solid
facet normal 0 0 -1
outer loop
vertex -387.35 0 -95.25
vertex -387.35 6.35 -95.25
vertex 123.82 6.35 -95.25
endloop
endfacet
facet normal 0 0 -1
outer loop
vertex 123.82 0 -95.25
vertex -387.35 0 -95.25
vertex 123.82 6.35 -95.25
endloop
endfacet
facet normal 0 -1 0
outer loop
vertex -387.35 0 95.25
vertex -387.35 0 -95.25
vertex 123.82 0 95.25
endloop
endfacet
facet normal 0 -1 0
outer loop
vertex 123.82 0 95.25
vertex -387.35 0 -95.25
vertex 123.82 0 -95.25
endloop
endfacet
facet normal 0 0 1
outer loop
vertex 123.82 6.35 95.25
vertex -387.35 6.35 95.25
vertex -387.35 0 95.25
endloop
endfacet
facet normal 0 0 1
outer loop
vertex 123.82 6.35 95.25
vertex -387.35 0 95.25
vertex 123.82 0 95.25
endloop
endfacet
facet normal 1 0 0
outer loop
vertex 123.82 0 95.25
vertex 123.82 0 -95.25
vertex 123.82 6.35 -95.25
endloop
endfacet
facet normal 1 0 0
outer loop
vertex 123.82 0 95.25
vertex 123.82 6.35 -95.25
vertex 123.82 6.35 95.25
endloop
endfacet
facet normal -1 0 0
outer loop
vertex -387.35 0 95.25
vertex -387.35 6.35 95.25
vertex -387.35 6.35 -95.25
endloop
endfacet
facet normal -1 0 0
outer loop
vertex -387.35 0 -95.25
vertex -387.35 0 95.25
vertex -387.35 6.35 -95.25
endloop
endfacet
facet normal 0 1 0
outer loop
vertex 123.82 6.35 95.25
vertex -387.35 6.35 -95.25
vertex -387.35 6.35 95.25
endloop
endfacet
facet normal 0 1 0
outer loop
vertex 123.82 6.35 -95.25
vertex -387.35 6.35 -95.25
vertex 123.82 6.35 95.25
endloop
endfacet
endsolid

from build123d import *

# Parameters (mm, degrees)
SKETCH1_W           = 762
SKETCH1_H           = 177.8
BOSS_EXTRUDE1_DEPTH = 6.35
SKETCH5_W           = 774.7
SKETCH5_H           = 190.5
SKETCH5_W_2         = 762
SKETCH5_H_2         = 177.8
BOSS_EXTRUDE2_DEPTH = 6.35
SKETCH7_W           = 263.53
SKETCH7_H           = 190.5
CUT_EXTRUDE2_DEPTH  = 399.939729157


with BuildPart() as part:
    # Sketch1 → Boss-Extrude1 (new body)
    with BuildSketch(Plane(origin=(0, 0, 0), x_dir=(1, 0, 0), z_dir=(0, 1, 0))):
        Rectangle(SKETCH1_W, SKETCH1_H)
    extrude(amount=BOSS_EXTRUDE1_DEPTH)

    # Sketch5 → Boss-Extrude2 (add)
    with BuildSketch(Plane(origin=(0, 6.35, 0), x_dir=(1, 0, 0), z_dir=(0, 1, 0))):
        Rectangle(SKETCH5_W, SKETCH5_H)
        Rectangle(SKETCH5_W_2, SKETCH5_H_2, mode=Mode.SUBTRACT)
    extrude(amount=-BOSS_EXTRUDE2_DEPTH)

    # Sketch7 → Cut-Extrude2 (cut, through all)
    with BuildSketch(Plane.XZ):
        with Locations((255.585, 0)):
            Rectangle(SKETCH7_W, SKETCH7_H)
    extrude(amount=-CUT_EXTRUDE2_DEPTH, mode=Mode.SUBTRACT)


solid = part.part
